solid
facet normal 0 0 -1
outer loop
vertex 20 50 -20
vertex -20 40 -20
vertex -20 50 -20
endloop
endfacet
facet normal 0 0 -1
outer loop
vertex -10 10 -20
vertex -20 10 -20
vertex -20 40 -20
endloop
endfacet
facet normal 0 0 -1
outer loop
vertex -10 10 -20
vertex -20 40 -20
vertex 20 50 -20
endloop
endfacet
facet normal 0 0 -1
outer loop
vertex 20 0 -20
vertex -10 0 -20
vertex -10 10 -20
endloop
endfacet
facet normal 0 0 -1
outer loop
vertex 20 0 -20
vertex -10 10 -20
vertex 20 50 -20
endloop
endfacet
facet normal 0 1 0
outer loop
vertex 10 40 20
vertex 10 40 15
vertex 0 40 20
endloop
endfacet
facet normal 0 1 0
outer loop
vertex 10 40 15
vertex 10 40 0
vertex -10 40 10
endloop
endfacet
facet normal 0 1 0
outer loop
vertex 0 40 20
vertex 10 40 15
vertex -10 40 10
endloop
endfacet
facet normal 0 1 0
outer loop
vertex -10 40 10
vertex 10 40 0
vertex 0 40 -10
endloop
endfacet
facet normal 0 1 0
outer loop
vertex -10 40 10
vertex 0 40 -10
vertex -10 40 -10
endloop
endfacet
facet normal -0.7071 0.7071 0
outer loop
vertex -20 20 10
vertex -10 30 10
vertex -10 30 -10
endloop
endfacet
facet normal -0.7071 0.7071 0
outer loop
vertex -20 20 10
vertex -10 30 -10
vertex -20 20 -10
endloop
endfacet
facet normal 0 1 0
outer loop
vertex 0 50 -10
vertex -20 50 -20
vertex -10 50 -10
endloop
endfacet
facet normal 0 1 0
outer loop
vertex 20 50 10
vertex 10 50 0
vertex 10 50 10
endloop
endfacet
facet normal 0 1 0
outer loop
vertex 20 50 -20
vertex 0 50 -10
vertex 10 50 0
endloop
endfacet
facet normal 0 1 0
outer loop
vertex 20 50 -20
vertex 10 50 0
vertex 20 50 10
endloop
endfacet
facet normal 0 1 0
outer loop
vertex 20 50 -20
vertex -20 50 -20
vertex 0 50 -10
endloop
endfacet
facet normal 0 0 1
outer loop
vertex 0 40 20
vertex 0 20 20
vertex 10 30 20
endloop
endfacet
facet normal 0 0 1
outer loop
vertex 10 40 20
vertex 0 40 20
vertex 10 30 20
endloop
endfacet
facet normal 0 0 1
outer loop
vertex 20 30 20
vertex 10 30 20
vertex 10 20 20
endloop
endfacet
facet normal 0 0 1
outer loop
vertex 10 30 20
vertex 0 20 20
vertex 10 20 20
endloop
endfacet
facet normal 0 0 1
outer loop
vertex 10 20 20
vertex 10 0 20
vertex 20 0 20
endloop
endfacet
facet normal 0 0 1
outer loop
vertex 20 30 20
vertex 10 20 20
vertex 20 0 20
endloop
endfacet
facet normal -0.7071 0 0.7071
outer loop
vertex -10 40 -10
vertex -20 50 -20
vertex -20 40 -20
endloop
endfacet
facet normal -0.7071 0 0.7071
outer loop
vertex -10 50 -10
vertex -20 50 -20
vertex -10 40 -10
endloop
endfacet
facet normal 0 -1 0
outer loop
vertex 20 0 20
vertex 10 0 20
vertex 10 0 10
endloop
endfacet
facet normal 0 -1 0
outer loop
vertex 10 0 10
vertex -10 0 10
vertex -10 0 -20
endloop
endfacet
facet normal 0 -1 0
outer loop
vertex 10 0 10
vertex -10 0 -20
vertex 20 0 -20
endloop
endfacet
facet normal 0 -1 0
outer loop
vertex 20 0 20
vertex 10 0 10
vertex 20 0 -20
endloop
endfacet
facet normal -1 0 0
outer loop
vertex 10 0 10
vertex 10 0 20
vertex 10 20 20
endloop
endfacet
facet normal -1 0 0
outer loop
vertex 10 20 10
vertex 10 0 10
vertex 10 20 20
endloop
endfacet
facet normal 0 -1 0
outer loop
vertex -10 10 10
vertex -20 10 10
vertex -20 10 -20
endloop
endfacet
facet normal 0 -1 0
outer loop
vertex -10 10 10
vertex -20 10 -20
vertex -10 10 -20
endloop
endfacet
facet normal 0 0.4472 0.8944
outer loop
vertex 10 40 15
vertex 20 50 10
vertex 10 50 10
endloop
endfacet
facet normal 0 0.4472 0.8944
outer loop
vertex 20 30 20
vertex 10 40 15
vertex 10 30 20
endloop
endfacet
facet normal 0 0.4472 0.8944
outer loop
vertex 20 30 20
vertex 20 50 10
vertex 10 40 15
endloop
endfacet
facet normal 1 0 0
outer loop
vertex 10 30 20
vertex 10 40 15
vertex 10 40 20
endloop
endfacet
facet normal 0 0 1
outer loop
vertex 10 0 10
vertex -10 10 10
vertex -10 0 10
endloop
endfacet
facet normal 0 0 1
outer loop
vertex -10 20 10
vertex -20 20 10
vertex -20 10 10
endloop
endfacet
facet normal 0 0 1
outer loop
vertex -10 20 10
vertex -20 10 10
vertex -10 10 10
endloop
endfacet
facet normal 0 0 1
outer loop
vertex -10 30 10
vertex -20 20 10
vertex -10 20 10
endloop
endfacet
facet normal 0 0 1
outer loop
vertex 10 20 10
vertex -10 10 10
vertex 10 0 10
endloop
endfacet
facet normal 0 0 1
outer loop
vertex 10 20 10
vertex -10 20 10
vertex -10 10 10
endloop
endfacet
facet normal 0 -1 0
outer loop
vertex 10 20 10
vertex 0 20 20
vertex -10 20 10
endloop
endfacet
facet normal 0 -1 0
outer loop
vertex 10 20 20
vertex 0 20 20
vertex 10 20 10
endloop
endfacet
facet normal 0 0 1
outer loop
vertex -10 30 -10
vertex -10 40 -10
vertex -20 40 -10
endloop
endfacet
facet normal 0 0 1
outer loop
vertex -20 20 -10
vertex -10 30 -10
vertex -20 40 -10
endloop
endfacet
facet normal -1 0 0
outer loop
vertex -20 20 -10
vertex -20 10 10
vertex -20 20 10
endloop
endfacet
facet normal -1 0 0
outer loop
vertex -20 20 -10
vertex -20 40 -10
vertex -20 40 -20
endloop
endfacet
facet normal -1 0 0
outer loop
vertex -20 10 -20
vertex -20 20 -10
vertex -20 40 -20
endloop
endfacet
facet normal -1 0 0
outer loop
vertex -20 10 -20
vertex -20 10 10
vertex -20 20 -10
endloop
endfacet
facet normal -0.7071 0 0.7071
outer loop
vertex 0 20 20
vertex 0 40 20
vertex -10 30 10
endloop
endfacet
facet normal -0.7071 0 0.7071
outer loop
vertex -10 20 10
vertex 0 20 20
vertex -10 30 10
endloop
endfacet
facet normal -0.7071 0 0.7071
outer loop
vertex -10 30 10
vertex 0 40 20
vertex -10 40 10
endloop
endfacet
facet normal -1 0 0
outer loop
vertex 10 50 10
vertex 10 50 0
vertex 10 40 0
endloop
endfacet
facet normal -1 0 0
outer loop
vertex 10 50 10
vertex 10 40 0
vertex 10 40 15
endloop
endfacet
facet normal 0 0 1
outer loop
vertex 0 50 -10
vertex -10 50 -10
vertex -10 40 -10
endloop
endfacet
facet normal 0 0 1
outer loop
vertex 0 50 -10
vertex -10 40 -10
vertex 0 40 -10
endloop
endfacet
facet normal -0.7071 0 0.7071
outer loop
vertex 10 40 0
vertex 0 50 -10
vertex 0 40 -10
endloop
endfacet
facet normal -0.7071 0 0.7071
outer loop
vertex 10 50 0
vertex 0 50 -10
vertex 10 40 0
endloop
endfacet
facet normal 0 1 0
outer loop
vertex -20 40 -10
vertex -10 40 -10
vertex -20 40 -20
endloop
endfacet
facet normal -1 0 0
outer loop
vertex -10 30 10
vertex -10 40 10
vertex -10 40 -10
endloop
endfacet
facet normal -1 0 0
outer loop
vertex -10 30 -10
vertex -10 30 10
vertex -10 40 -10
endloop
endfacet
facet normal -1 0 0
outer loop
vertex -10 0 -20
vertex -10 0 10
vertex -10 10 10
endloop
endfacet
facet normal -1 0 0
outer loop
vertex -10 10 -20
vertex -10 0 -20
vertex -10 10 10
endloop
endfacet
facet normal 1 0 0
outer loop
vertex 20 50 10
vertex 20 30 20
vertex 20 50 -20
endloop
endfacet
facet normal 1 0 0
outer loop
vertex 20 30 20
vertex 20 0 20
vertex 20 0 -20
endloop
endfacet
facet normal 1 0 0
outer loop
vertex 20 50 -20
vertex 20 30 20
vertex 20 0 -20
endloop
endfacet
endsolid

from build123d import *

# Parameters (mm, degrees)
SKETCH1_W           = 40
SKETCH1_H           = 40
BOSS_EXTRUDE1_DEPTH = 50
CUT_EXTRUDE1_DEPTH  = 10
CUT_EXTRUDE2_DEPTH  = 10
CUT_EXTRUDE5_DEPTH  = 10
CUT_EXTRUDE6_DEPTH  = 30
CUT_EXTRUDE7_DEPTH  = 10
SKETCH10_W          = 10
SKETCH10_H          = 10
CUT_EXTRUDE8_DEPTH  = 10
SKETCH11_W          = 30
SKETCH11_H          = 20
CUT_EXTRUDE9_DEPTH  = 10
SKETCH13_W          = 10
SKETCH13_H          = 10
CUT_EXTRUDE10_DEPTH = 31


with BuildPart() as part:
    # Sketch1 → Boss-Extrude1 (new body)
    with BuildSketch(Plane(origin=(0, 0, 0), x_dir=(1, 0, 0), z_dir=(0, 1, 0))):
        Rectangle(SKETCH1_W, SKETCH1_H)
    extrude(amount=BOSS_EXTRUDE1_DEPTH)

    # Sketch2 → Cut-Extrude1 (cut)
    with BuildSketch(Plane(origin=(0, 50, 0), x_dir=(1, 0, 0), z_dir=(0, 1, 0))):
        Polygon((-20, 20), (-10, 10), (0, 10), (10, 0), (10, -20), (-20, -20), align=None)
    extrude(amount=-CUT_EXTRUDE1_DEPTH, mode=Mode.SUBTRACT)

    # Sketch3 → Cut-Extrude2 (cut)
    with BuildSketch(Plane(origin=(20, 0, 0), x_dir=(0, 0, -1), z_dir=(1, 0, 0))):
        Polygon((-20, 50), (-10, 50), (-20, 30), align=None)
    extrude(amount=-CUT_EXTRUDE2_DEPTH, mode=Mode.SUBTRACT)

    # Sketch7 → Cut-Extrude5 (cut)
    with BuildSketch(Plane(origin=(0, 40, 0), x_dir=(1, 0, 0), z_dir=(0, 1, 0))):
        Polygon((0, -20), (-10, -10), (-10, 10), (-20, 10), (-20, -20), align=None)
    extrude(amount=-CUT_EXTRUDE5_DEPTH, mode=Mode.SUBTRACT)

    # Sketch8 → Cut-Extrude6 (cut)
    with BuildSketch(Plane.XY.offset(20)):
        Polygon((-10, 30), (-20, 20), (-20, 30), align=None)
    extrude(amount=-CUT_EXTRUDE6_DEPTH, mode=Mode.SUBTRACT)

    # Sketch9 → Cut-Extrude7 (cut)
    with BuildSketch(Plane(origin=(0, 30, 0), x_dir=(1, 0, 0), z_dir=(0, 1, 0))):
        Polygon((0, -20), (-10, -10), (-10, -20), align=None)
    extrude(amount=-CUT_EXTRUDE7_DEPTH, mode=Mode.SUBTRACT)

    # Sketch10 → Cut-Extrude8 (cut)
    with BuildSketch(Plane(origin=(-10, 0, 0), x_dir=(0, 0, -1), z_dir=(1, 0, 0))):
        with Locations((-15, 25)):
            Rectangle(SKETCH10_W, SKETCH10_H)
    extrude(amount=-CUT_EXTRUDE8_DEPTH, mode=Mode.SUBTRACT)

    # Sketch11 → Cut-Extrude9 (cut)
    with BuildSketch(Plane.XY.offset(20)):
        with Locations((-5, 10)):
            Rectangle(SKETCH11_W, SKETCH11_H)
    extrude(amount=-CUT_EXTRUDE9_DEPTH, mode=Mode.SUBTRACT)

    # Sketch13 → Cut-Extrude10 (cut, through all)
    with BuildSketch(Plane.XY.offset(10)):
        with Locations((-15, 5)):
            Rectangle(SKETCH13_W, SKETCH13_H)
    extrude(amount=-CUT_EXTRUDE10_DEPTH, mode=Mode.SUBTRACT)


solid = part.part
